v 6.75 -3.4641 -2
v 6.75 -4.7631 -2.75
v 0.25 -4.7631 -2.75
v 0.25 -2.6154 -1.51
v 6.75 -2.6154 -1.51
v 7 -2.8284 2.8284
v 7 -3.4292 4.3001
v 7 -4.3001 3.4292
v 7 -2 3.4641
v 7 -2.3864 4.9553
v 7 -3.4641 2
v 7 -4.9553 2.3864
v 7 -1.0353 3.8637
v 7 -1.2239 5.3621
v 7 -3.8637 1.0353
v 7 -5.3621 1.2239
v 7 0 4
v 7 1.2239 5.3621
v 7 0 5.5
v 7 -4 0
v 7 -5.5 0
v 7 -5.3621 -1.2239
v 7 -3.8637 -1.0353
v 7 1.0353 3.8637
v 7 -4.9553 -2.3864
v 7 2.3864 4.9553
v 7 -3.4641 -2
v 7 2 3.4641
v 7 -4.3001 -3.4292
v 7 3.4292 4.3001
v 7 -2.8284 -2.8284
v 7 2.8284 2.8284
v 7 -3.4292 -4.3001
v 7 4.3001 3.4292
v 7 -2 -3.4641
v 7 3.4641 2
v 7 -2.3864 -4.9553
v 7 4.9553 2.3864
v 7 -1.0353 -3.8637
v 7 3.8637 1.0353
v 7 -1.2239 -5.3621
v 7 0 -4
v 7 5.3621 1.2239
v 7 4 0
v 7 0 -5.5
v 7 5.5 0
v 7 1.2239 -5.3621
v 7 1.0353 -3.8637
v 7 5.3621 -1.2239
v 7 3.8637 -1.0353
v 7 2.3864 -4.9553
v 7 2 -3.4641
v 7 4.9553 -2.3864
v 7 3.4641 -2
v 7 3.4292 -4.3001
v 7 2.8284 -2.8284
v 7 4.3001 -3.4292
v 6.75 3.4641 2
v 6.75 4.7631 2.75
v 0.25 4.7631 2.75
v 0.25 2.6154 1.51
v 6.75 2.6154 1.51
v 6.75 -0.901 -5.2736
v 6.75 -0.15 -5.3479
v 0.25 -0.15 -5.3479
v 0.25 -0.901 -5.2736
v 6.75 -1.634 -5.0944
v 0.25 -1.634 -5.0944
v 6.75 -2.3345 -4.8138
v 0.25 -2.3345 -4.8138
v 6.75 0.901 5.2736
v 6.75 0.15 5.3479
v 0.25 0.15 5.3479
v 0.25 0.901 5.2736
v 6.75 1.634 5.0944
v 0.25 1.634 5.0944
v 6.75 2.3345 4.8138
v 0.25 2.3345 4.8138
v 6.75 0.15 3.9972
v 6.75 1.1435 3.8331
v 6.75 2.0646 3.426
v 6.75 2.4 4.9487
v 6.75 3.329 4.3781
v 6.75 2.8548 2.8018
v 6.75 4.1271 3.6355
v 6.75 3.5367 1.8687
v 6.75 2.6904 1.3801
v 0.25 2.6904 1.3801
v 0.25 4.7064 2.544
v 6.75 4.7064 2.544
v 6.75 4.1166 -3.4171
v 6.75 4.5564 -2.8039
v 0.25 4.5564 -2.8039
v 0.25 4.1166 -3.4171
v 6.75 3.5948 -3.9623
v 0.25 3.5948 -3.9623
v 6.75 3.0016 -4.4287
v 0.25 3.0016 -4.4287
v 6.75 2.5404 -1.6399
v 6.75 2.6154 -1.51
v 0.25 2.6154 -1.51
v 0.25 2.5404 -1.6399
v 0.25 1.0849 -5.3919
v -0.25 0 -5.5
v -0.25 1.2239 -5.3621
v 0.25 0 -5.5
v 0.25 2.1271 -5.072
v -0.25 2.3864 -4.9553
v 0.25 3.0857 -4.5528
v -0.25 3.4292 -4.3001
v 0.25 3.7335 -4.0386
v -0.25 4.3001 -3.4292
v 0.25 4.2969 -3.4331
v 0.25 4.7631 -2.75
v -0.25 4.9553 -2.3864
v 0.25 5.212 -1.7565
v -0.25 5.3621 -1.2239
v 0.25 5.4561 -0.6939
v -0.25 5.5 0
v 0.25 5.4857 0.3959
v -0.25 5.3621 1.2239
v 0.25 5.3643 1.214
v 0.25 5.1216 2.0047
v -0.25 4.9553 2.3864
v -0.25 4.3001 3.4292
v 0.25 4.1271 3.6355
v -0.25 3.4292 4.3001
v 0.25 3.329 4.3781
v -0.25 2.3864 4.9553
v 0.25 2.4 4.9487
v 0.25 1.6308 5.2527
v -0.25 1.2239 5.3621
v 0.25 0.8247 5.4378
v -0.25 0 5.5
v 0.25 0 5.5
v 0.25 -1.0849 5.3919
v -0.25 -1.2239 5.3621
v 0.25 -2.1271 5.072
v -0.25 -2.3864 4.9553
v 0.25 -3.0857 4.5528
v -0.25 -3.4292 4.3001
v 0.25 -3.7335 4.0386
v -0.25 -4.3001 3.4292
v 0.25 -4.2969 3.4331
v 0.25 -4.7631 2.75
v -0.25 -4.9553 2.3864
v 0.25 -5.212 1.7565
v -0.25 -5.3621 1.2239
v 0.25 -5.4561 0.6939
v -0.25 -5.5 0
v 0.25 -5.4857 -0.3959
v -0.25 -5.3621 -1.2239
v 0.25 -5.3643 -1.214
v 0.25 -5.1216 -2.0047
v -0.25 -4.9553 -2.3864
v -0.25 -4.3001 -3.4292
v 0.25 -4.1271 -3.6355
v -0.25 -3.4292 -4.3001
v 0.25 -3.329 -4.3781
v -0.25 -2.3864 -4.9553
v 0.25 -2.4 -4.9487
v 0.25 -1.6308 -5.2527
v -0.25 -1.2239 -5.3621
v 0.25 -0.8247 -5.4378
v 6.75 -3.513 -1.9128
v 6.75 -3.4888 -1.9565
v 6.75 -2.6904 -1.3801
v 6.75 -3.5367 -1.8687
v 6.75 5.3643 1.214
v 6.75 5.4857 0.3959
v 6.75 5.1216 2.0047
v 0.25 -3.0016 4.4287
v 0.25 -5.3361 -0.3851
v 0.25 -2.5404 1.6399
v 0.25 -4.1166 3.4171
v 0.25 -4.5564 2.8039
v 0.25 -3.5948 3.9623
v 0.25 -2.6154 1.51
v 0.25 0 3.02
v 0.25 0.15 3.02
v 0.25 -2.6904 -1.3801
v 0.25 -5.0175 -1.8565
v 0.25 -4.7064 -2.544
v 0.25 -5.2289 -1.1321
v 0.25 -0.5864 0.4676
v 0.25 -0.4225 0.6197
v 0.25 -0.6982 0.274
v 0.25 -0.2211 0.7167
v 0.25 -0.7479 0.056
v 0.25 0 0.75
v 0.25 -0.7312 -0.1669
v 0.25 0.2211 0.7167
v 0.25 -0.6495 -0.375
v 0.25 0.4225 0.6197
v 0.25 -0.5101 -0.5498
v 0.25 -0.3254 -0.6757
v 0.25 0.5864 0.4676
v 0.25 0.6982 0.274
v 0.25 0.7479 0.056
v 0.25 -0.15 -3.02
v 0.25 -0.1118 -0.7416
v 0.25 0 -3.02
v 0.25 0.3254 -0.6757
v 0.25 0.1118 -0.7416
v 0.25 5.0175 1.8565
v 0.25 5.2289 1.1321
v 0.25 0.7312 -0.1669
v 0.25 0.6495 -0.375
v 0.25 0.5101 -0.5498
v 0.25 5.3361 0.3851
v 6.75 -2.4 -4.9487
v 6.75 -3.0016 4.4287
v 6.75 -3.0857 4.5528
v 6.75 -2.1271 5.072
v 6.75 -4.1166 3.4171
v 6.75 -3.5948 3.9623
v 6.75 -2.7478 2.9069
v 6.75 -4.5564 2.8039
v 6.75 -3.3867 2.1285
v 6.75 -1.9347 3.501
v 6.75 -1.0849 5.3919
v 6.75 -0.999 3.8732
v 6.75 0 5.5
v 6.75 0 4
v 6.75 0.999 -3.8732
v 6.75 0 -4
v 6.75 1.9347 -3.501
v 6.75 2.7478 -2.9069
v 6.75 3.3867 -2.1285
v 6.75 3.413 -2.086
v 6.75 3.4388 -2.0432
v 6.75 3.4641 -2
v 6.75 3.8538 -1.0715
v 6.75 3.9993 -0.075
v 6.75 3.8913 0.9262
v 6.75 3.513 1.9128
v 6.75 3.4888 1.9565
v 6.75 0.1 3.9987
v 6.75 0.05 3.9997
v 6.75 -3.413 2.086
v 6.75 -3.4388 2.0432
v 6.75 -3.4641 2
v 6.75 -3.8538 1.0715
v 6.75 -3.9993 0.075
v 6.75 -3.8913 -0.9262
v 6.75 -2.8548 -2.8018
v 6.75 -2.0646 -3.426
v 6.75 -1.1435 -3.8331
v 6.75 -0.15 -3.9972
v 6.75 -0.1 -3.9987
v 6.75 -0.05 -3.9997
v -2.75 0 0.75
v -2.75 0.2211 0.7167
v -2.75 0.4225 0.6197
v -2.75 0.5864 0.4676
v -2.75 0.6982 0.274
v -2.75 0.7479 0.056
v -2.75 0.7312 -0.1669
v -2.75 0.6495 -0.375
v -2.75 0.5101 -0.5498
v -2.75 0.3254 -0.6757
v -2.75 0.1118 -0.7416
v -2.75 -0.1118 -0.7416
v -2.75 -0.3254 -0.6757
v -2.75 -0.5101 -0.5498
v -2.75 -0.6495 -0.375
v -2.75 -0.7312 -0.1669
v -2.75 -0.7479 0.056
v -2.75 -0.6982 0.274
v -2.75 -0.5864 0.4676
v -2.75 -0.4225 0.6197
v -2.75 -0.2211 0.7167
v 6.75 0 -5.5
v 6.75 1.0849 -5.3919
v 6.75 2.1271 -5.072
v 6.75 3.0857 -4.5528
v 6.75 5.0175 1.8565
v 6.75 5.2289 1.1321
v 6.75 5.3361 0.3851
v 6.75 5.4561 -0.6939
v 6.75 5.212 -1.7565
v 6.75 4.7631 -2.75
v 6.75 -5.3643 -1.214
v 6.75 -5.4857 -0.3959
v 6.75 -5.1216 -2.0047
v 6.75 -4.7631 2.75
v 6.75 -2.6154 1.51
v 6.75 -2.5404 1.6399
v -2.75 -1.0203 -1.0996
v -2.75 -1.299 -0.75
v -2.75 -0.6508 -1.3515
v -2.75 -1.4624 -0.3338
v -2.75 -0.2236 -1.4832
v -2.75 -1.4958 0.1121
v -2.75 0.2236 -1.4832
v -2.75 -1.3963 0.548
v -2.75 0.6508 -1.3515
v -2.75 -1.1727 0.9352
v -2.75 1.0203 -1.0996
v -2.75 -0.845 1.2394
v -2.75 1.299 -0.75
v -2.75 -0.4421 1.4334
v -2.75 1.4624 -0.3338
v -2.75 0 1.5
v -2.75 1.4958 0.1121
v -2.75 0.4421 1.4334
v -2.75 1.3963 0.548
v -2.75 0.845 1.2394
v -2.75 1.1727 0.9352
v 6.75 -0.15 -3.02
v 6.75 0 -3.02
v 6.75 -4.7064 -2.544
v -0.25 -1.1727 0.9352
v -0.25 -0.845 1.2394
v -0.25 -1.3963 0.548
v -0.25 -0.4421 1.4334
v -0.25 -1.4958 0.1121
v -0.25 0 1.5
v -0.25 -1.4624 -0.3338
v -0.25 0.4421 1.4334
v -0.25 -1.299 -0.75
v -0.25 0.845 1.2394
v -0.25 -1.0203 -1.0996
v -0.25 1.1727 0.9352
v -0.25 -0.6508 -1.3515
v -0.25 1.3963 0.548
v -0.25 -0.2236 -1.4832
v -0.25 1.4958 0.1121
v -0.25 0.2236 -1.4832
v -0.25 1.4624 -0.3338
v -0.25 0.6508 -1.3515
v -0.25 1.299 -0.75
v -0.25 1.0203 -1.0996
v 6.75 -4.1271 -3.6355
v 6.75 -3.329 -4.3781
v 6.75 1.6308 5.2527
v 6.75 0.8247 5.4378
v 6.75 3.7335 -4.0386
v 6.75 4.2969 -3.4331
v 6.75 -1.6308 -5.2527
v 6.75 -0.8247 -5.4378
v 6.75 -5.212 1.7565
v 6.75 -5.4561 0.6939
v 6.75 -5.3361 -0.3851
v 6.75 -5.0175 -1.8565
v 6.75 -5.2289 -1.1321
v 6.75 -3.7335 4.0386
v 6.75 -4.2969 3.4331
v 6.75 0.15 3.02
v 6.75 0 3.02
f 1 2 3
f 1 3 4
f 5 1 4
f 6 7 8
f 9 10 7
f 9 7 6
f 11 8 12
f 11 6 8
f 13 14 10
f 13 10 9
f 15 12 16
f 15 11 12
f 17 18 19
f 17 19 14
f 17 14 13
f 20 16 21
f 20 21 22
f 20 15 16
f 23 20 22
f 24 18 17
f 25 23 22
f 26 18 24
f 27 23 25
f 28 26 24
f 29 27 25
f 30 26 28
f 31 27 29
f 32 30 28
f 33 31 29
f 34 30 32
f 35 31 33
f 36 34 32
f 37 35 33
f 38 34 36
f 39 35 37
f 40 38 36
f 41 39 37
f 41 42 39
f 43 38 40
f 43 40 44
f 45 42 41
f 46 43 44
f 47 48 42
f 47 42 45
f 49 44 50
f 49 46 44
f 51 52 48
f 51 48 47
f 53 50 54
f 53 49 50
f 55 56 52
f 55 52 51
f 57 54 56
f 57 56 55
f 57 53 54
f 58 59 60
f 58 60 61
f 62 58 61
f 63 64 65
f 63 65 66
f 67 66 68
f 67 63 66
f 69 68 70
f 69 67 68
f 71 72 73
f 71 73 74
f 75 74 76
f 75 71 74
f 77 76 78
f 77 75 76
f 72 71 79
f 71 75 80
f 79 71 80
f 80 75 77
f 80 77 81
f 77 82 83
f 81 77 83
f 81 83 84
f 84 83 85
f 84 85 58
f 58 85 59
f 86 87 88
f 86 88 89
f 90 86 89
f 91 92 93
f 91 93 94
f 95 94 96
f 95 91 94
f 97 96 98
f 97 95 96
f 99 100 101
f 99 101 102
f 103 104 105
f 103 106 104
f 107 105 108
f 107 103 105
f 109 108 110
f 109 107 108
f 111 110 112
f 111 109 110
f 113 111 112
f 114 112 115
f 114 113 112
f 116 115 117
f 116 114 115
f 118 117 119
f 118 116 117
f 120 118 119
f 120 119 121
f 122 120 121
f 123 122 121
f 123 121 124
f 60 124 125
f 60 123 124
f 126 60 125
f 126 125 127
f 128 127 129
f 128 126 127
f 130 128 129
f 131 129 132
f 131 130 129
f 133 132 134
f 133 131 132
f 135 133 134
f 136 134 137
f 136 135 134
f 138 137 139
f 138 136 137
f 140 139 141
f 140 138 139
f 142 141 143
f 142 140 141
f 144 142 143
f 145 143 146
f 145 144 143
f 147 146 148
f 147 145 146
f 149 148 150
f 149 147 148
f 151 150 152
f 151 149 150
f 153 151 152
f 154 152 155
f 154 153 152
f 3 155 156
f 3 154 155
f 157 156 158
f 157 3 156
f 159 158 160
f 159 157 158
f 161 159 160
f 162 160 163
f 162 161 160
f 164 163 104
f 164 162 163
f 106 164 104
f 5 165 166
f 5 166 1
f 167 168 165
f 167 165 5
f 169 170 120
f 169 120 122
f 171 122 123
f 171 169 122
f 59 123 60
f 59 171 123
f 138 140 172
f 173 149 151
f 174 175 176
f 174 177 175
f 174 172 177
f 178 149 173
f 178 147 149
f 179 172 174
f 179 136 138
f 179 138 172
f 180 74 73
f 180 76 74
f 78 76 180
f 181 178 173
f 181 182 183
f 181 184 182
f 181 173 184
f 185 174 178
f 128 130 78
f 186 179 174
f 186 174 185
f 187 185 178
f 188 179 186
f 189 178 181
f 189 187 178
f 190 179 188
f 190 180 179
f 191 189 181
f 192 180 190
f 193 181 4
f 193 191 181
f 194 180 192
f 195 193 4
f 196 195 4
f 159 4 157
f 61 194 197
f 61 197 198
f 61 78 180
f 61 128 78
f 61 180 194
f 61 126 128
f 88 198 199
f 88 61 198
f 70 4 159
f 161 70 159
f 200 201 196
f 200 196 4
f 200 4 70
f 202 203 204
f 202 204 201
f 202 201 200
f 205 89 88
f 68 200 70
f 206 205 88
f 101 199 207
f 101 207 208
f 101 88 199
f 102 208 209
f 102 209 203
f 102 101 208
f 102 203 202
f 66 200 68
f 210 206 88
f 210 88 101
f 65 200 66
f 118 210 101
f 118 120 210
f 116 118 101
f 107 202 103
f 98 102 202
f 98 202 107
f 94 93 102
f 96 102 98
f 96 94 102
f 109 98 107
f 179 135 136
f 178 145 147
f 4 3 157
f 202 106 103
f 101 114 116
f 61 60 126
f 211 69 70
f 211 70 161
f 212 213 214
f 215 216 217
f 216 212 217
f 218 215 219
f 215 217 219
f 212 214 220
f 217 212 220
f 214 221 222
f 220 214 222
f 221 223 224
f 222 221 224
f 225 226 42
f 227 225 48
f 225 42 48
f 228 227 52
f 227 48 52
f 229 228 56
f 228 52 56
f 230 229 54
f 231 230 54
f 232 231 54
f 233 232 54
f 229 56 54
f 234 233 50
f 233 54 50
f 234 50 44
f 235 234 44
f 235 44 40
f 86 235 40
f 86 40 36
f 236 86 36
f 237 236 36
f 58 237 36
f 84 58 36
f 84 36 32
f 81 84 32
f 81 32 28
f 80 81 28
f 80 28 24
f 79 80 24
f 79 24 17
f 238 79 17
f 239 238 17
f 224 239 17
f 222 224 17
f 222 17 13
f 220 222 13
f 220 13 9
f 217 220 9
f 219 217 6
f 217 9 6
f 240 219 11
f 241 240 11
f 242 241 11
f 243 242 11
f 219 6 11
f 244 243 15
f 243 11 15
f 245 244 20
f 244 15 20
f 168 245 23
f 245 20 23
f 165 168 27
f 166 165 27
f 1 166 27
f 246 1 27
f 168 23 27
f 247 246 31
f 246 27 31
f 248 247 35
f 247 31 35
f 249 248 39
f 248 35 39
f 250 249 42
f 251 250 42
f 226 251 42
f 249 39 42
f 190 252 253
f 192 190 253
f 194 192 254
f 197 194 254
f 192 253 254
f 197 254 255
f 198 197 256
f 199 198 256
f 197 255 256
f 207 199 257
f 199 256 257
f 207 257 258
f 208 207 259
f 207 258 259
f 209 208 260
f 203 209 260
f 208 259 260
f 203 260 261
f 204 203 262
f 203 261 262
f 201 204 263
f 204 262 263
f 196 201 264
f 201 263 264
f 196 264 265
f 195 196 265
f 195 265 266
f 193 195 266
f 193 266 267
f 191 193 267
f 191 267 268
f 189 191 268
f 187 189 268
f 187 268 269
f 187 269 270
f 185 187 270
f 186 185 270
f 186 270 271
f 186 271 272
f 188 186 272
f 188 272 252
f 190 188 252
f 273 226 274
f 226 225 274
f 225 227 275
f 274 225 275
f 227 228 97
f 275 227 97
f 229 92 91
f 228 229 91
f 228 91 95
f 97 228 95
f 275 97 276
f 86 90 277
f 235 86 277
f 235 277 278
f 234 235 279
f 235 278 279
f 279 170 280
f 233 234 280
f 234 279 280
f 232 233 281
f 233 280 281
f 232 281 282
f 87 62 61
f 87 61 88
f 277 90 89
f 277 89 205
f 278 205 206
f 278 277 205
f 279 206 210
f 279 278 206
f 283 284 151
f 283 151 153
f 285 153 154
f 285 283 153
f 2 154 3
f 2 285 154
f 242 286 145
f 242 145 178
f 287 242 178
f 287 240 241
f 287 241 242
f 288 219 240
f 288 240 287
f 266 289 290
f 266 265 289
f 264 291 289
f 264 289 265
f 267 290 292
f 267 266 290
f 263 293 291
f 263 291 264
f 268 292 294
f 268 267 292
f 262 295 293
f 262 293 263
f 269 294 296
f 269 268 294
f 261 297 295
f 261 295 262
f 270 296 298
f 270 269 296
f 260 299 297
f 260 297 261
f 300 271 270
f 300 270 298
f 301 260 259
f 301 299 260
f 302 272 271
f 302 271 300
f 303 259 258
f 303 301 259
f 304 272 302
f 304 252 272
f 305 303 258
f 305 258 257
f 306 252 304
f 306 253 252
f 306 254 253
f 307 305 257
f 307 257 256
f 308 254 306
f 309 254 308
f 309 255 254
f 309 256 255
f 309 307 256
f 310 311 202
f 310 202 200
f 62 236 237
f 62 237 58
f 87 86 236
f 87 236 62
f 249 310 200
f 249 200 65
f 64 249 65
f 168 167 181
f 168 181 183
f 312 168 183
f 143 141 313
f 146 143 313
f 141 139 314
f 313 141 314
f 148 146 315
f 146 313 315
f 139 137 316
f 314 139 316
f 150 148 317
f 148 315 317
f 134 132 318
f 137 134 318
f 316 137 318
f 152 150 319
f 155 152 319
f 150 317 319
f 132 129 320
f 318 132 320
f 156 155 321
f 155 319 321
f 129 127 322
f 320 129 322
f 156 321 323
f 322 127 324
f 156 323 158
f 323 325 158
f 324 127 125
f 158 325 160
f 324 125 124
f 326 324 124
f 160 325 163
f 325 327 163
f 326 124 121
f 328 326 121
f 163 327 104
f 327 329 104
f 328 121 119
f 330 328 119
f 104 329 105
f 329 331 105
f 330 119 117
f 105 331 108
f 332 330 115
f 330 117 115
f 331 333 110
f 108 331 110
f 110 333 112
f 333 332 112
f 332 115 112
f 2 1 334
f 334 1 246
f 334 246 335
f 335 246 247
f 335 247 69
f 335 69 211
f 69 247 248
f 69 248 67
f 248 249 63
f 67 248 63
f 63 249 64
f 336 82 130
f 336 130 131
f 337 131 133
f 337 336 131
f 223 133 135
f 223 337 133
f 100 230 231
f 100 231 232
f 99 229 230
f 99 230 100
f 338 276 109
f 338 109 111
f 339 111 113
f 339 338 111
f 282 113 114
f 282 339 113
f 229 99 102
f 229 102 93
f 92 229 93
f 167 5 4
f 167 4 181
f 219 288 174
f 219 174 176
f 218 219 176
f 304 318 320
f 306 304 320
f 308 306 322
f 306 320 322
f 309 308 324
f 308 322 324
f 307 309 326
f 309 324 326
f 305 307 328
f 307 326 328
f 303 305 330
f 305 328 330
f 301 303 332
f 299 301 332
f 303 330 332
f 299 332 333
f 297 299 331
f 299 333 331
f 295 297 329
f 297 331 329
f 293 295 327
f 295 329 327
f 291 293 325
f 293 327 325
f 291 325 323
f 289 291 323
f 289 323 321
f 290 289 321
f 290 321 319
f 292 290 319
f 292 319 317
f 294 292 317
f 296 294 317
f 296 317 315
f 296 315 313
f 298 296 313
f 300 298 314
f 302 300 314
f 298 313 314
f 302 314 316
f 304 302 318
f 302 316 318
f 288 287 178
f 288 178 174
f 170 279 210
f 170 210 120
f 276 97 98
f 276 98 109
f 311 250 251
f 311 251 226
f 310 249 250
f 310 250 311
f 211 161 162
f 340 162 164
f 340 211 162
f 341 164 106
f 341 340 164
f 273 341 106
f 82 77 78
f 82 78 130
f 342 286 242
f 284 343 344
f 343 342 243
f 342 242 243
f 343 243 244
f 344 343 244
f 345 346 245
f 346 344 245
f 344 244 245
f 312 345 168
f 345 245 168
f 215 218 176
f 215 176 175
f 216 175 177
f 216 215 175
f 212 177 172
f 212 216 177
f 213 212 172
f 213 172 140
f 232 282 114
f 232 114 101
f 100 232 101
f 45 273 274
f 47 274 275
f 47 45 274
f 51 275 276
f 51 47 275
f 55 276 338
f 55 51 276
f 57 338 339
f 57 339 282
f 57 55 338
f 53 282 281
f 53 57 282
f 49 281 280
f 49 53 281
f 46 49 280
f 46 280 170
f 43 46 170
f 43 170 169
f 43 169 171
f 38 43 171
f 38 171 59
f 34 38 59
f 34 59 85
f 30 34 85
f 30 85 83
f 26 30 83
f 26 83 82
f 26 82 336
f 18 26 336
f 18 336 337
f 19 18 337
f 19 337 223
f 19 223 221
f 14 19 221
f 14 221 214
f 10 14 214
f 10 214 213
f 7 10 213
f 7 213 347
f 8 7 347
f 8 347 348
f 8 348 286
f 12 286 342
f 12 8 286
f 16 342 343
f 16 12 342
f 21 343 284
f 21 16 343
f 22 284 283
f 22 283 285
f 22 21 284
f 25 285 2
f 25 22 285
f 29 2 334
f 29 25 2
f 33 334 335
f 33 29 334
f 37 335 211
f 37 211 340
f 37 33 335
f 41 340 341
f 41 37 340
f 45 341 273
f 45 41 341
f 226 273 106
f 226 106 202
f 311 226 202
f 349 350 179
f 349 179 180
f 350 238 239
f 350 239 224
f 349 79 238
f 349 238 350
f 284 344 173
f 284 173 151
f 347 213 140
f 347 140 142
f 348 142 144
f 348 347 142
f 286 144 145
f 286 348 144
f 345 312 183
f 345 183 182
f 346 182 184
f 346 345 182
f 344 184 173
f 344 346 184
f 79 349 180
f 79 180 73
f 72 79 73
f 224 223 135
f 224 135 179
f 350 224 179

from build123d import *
from build123d.topology import SkipClean

# Parameters (mm, degrees)
SKETCH1_R           = 5.5
BOSS_EXTRUDE1_DEPTH = 0.25
SKETCH2_R           = 1.5
BOSS_EXTRUDE2_DEPTH = 2.5
SKETCH3_R           = 0.75
CUT_EXTRUDE1_DEPTH  = 9.336666
BOSS_EXTRUDE3_START = 6.5
BOSS_EXTRUDE3_DEPTH = 6.5
CIRPATTERN1_COUNT   = 6
BOSS_EXTRUDE6_START = 0.25
SKETCH5_R           = 5.5
SKETCH5_R_2         = 4
BOSS_EXTRUDE6_DEPTH = 0.25


with BuildPart() as part:
    # Sketch1 → Boss-Extrude1 (new, symmetric)
    with BuildSketch(Plane(origin=(0, 0, 0), x_dir=(0, 0, -1), z_dir=(1, 0, 0))):
        Circle(SKETCH1_R)
    extrude(amount=BOSS_EXTRUDE1_DEPTH, both=True)

    # Sketch2 → Boss-Extrude2 (add)
    with BuildSketch(Plane.ZY.offset(0.25)):
        Circle(SKETCH2_R)
    extrude(amount=BOSS_EXTRUDE2_DEPTH)

    # Sketch3 → Cut-Extrude1 (cut, through all)
    with BuildSketch(Plane.ZY.offset(2.75)):
        Circle(SKETCH3_R)
    extrude(amount=-CUT_EXTRUDE1_DEPTH, mode=Mode.SUBTRACT)

    # Sketch4 → Boss-Extrude3 (add)
    with BuildSketch(Plane(origin=(0.25, 0, 0), x_dir=(0, 0, -1), z_dir=(1, 0, 0)).offset(BOSS_EXTRUDE3_START)):
        with BuildLine():
            Line((-5.5, 0), (-3.02, 0))
            Line((-3.02, 0), (-3.02, 0.15))
            Line((-3.02, 0.15), (-5.347896783, 0.15))
            ThreePointArc((-5.347896783, 0.15), (-5.196916014, 1.270654927), (-4.813771652, 2.334545455))
            Line((-4.813771652, 2.334545455), (-4.948737213, 2.4))
            ThreePointArc((-4.948737213, 2.4), (-5.360412982, 1.231248417), (-5.5, 0))
        make_face()
    boss_extrude3 = extrude(amount=-BOSS_EXTRUDE3_DEPTH)

    # CirPattern1: Boss-Extrude3 ×6 about axis
    with SkipClean():  # the faces are left unmerged after this step: merging them gives an invalid solid
        cirpattern1_axis = Axis((0, 0, 0), (1, 0, 0))
        for i in range(1, CIRPATTERN1_COUNT):
            add(boss_extrude3.rotate(cirpattern1_axis, i * 360 / CIRPATTERN1_COUNT))

    # Sketch5 → Boss-Extrude6 (add)
    with SkipClean():  # the faces are left unmerged after this step: merging them gives an invalid solid
        with BuildSketch(Plane(origin=(6.75, 0, 0), x_dir=(0, 0, -1), z_dir=(1, 0, 0)).offset(BOSS_EXTRUDE6_START)):
            Circle(SKETCH5_R)
            Circle(SKETCH5_R_2, mode=Mode.SUBTRACT)
        extrude(amount=-BOSS_EXTRUDE6_DEPTH)


solid = part.part
